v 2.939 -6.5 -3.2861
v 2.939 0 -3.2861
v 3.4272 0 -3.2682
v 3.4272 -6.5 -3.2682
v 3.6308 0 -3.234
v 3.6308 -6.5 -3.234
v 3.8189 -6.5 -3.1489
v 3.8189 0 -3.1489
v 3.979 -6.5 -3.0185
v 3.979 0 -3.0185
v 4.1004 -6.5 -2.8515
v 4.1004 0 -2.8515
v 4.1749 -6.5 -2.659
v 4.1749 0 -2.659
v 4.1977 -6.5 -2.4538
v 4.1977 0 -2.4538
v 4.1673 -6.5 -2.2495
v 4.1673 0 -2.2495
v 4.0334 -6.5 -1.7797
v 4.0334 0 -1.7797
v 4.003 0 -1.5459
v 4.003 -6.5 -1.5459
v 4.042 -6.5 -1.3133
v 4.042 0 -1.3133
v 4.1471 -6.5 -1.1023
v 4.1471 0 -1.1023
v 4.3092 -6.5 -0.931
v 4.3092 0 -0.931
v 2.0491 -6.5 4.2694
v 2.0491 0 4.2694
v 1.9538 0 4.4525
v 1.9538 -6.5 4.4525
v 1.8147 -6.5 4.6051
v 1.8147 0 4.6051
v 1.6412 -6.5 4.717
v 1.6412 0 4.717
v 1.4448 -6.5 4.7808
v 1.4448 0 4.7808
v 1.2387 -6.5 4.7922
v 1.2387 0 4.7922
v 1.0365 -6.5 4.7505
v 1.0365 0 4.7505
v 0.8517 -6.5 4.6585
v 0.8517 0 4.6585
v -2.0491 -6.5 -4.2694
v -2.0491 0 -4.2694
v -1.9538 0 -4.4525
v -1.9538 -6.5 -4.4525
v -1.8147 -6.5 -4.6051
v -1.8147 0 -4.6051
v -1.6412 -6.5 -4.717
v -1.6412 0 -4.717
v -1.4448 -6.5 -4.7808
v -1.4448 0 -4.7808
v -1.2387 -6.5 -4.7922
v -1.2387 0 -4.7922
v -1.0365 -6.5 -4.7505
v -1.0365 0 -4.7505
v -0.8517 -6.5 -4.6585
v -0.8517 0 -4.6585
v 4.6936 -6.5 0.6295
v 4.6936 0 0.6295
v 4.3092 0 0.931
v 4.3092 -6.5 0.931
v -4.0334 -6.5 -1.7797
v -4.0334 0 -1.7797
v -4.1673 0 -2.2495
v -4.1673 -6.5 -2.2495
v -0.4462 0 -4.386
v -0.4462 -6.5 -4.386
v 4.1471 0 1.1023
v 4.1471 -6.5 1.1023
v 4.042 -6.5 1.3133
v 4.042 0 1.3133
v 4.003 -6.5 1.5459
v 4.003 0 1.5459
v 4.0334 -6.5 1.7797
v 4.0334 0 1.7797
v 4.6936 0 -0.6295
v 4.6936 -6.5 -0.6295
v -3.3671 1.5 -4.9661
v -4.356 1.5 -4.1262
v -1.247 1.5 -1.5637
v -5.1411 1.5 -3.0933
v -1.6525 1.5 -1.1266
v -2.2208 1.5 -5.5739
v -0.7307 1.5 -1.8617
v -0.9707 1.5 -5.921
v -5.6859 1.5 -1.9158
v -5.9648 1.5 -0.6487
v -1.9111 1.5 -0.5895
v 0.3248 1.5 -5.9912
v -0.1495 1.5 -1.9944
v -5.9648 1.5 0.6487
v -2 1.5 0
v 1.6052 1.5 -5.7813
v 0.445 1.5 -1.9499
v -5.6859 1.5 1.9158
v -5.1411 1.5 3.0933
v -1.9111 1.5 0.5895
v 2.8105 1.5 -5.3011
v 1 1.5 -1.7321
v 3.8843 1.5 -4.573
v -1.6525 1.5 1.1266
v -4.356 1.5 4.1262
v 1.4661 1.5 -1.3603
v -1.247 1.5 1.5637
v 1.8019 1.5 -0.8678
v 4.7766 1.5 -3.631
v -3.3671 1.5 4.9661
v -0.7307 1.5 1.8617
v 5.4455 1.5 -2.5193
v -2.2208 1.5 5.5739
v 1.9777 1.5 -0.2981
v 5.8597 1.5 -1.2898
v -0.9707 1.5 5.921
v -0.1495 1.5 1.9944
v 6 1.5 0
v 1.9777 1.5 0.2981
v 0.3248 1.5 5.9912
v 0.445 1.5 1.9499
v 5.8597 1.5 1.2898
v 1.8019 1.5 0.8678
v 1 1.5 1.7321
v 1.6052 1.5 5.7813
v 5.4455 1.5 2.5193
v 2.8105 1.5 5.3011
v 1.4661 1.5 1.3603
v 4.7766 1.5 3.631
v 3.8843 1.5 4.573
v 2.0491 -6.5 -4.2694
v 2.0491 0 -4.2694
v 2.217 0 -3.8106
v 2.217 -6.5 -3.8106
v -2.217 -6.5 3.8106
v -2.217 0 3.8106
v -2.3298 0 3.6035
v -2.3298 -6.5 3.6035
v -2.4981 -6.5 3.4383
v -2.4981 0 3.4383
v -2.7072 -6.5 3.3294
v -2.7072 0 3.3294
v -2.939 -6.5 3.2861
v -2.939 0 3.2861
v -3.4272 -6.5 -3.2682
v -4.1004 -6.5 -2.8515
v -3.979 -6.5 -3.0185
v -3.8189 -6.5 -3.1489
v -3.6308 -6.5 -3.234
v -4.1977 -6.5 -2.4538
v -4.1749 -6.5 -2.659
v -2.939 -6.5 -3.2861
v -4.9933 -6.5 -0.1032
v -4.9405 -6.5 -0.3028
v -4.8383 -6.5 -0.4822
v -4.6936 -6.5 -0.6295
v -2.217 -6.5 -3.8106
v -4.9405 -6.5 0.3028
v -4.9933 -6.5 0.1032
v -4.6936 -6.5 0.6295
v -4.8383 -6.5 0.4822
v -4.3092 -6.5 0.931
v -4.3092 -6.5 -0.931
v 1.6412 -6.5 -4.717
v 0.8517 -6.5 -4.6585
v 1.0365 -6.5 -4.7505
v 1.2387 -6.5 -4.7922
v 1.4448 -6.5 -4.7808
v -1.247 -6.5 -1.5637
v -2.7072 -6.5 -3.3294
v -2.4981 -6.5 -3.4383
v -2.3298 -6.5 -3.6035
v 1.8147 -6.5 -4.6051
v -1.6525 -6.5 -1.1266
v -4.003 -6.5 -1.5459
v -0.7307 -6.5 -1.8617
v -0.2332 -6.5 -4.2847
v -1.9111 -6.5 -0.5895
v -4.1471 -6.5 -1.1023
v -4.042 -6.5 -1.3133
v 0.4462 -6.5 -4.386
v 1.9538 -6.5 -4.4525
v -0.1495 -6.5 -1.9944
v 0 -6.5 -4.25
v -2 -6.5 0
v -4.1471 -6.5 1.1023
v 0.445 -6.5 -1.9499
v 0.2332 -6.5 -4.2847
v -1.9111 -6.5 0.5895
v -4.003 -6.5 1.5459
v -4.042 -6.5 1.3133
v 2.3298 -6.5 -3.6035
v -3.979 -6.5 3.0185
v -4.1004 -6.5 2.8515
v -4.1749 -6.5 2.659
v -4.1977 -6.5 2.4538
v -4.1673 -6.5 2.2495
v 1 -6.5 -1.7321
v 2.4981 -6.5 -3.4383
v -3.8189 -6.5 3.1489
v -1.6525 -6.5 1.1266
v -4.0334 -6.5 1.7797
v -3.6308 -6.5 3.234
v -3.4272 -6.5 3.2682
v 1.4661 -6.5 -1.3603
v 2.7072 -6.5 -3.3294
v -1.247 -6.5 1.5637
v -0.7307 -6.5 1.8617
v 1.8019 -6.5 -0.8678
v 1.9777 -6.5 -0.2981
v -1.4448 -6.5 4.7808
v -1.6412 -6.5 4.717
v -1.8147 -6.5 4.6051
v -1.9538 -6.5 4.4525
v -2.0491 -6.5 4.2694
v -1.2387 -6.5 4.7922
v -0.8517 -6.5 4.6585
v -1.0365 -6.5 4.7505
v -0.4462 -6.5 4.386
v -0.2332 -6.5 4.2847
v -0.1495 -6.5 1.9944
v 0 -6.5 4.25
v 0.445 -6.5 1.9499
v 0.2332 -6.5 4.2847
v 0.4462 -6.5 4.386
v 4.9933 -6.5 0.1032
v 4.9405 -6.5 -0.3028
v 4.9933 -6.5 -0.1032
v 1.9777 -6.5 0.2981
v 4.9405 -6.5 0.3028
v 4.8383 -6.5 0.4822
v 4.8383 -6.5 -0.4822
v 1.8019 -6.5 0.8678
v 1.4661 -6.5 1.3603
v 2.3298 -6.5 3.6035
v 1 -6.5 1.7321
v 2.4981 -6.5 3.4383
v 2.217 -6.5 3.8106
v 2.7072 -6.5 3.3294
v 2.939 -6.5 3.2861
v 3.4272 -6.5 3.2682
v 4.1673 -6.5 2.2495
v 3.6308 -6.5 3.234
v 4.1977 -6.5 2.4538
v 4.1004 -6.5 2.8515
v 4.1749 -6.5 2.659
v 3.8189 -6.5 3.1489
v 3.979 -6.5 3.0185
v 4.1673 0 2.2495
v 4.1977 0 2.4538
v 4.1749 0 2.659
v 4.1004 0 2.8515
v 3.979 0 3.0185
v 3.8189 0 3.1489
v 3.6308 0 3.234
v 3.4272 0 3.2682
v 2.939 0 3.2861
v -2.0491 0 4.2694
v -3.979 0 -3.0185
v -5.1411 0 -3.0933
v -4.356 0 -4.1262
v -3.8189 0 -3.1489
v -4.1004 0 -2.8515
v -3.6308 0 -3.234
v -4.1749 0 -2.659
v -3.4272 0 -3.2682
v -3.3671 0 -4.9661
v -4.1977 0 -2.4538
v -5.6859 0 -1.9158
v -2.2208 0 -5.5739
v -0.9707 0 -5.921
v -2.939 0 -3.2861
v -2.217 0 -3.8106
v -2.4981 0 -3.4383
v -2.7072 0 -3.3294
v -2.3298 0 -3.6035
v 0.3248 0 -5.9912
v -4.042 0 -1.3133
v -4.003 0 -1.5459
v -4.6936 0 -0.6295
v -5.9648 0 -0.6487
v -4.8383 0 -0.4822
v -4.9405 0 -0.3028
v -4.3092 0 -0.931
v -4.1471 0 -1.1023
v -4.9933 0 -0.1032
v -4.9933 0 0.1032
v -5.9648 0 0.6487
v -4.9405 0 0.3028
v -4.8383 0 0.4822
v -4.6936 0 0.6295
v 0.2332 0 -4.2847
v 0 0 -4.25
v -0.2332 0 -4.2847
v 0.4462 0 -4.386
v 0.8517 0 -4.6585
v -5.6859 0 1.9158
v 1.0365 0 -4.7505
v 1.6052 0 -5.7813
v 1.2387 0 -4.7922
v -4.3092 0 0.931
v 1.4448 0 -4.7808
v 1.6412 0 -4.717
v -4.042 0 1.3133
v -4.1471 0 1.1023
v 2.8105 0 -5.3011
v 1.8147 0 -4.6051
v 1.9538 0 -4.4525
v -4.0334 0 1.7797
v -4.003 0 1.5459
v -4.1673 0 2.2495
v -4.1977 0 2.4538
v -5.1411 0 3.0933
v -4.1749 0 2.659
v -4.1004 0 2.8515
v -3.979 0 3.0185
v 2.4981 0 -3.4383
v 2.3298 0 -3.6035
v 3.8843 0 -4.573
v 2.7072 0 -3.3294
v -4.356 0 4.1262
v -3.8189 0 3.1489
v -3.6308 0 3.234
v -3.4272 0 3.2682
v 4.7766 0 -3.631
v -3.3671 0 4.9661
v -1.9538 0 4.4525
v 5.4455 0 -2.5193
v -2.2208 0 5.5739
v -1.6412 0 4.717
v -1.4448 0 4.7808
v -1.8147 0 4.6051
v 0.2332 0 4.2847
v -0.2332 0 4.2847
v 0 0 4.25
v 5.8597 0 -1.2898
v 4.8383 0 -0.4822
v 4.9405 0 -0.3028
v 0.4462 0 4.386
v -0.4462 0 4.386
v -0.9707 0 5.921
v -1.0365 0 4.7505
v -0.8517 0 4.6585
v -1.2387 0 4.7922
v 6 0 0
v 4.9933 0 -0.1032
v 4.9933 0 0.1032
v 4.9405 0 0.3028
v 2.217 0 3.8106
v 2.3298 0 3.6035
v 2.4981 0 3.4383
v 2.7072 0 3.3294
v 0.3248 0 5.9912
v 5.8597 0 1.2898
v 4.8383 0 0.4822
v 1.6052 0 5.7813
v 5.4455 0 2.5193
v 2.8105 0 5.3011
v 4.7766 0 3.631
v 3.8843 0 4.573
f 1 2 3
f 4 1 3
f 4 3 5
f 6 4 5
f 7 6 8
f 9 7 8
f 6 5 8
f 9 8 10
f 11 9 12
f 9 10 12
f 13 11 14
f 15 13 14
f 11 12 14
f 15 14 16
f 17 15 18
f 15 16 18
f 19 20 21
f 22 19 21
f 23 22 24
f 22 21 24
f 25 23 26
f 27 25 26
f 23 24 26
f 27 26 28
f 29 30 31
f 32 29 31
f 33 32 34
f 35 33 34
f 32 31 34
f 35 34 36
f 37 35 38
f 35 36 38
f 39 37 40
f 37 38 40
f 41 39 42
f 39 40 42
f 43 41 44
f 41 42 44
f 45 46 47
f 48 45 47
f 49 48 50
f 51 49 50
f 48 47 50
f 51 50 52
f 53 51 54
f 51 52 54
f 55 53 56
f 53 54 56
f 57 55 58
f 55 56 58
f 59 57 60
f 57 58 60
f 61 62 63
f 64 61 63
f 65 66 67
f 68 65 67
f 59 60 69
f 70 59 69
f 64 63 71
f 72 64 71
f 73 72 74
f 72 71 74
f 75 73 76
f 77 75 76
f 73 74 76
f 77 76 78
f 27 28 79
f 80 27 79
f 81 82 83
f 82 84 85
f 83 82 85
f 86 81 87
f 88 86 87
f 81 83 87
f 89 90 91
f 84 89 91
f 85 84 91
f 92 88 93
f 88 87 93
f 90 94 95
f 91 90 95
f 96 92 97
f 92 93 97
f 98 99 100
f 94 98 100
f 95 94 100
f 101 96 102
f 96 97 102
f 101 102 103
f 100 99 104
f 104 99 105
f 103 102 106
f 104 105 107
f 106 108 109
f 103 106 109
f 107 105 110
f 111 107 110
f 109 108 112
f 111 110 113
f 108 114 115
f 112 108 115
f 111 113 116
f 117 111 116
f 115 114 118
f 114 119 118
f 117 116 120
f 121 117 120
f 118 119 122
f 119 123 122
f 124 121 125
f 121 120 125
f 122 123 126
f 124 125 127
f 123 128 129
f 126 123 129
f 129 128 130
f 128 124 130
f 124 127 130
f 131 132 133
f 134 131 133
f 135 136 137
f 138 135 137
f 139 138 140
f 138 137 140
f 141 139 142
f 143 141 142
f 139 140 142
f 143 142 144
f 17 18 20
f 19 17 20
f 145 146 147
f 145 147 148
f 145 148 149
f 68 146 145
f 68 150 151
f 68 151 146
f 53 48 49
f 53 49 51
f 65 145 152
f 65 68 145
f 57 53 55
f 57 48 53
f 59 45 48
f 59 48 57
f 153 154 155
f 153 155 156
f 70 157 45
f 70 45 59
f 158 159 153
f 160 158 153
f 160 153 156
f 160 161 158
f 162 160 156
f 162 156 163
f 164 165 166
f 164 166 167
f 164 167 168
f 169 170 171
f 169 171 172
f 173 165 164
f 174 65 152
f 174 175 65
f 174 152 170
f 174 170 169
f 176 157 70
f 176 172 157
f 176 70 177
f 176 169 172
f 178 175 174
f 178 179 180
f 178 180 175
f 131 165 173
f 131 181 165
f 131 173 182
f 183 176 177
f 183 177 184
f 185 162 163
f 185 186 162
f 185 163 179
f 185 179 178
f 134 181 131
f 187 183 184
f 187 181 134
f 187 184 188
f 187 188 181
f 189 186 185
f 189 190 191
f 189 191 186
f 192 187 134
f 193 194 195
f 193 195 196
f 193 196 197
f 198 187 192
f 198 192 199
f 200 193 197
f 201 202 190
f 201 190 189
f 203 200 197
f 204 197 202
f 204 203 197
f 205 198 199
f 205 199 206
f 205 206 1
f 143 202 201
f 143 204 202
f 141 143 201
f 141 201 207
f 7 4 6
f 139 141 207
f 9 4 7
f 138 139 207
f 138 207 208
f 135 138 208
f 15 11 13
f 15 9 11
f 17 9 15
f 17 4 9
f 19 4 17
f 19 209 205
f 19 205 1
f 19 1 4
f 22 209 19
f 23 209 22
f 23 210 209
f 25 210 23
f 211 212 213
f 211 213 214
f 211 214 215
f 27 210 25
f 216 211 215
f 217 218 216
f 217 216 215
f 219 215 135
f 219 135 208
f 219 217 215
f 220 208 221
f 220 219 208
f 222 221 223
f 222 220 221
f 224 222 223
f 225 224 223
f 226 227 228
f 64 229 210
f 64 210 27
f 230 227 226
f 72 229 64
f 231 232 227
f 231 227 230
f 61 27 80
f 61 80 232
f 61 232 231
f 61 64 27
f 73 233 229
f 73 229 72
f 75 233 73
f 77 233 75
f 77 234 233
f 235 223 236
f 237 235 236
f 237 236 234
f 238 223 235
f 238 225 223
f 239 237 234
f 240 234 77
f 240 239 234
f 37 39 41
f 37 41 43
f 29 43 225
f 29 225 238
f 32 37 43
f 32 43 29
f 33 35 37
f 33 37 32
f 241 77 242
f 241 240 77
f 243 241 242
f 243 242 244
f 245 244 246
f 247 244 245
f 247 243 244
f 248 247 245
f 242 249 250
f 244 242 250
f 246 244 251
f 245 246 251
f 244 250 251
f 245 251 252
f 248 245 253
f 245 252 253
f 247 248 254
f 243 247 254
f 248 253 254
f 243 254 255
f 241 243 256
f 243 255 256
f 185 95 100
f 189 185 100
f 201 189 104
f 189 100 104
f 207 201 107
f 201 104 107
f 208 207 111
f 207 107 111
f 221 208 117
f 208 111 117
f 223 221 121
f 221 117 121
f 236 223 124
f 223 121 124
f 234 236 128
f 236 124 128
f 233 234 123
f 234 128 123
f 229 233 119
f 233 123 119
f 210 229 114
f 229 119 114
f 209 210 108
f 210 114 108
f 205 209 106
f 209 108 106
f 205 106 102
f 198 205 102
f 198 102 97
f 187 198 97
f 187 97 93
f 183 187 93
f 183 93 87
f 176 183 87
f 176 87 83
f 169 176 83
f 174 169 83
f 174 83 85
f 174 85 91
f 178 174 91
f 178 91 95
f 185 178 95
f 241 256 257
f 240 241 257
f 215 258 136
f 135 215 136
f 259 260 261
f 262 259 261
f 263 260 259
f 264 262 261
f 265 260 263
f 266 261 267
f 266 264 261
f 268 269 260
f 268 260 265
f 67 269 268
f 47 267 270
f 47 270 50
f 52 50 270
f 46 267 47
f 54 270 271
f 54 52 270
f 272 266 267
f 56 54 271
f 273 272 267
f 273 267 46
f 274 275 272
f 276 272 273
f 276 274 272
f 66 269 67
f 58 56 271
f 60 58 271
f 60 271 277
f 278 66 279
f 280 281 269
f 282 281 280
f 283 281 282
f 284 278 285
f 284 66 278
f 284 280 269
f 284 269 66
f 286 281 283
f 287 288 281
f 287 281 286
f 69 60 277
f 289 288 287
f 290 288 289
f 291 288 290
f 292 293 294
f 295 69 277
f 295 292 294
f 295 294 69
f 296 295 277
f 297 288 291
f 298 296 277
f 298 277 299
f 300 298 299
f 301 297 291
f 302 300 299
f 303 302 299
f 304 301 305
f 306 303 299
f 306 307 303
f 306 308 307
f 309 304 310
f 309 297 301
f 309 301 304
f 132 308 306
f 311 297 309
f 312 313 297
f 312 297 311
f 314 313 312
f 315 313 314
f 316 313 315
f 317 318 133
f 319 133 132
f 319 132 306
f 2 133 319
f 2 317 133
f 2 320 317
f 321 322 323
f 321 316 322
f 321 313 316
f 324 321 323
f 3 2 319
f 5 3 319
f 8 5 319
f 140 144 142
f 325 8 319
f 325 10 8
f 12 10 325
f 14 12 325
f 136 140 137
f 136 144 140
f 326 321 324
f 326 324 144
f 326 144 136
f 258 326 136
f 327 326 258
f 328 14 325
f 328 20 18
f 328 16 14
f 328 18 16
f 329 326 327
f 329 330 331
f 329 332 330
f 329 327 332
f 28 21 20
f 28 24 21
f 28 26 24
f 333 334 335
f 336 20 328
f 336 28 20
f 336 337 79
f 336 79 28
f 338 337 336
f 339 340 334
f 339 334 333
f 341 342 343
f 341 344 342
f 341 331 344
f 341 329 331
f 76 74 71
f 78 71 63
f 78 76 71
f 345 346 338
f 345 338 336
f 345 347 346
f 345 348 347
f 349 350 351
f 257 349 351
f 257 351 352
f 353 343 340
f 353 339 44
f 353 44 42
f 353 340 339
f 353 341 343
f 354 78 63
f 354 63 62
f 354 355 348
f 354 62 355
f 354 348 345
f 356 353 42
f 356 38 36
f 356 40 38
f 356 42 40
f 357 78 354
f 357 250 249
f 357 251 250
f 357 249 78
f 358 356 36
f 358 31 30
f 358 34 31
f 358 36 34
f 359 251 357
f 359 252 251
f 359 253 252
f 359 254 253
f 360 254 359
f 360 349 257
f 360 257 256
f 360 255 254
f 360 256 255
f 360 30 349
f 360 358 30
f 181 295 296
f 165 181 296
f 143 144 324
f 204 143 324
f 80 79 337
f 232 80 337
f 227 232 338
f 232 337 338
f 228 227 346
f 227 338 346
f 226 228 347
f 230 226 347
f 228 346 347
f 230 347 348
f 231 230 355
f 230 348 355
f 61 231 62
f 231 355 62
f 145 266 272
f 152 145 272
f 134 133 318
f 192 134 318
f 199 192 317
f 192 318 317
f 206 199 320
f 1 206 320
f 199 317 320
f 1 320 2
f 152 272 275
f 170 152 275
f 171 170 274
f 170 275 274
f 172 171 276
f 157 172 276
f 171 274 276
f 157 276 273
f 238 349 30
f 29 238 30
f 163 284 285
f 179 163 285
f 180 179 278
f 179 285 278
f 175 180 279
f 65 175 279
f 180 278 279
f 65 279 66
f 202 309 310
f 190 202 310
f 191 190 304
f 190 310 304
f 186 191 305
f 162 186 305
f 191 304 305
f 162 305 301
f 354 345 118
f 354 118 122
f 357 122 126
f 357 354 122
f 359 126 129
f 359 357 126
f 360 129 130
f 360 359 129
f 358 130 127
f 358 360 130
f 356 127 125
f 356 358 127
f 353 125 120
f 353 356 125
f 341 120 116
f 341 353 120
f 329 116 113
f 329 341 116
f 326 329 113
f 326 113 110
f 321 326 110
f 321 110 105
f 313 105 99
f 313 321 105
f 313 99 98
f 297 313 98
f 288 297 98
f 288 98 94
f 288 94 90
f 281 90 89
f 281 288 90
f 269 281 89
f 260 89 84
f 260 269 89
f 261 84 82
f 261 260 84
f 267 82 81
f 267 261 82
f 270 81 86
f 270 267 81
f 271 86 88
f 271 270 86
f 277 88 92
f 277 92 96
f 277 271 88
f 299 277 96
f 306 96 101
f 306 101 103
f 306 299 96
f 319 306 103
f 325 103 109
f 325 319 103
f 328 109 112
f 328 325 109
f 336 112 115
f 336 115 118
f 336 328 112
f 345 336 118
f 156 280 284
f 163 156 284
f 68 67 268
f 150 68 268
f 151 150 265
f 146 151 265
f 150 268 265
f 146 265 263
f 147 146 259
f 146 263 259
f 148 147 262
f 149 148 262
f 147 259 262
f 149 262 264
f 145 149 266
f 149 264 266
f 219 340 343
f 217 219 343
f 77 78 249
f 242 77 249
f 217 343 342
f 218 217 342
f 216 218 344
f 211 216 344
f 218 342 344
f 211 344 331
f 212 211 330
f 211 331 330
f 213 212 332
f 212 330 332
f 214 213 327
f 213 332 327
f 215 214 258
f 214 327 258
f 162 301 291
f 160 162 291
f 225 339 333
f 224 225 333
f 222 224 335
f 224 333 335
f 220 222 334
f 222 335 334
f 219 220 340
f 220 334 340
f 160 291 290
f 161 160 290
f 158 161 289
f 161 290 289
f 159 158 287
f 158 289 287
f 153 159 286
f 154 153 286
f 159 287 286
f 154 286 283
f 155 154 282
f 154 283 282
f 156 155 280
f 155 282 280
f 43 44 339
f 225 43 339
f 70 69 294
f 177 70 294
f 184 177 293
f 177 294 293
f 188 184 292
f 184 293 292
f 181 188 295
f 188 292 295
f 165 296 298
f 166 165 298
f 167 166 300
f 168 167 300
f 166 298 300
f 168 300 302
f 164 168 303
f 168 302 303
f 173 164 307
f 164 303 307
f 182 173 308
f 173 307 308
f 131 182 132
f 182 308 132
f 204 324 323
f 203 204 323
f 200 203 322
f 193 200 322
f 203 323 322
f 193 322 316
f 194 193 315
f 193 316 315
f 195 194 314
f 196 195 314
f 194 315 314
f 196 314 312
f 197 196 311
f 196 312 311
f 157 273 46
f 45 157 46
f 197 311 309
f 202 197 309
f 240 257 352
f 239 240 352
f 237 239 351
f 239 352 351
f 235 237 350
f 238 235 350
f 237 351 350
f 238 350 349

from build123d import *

# Parameters (mm, degrees)
F1_DEPTH = 6.5
F0_R     = 6
F2_DEPTH = 1.5
F4_D     = 4


with BuildPart() as f1:
    # F0 (on Front) → F1 (new body)
    with BuildSketch(Plane.XZ):
        with BuildLine():
            ThreePointArc((2.938982, 3.286074), (2.498087, 3.438322), (2.217047, 3.810591))
            Line((2.217047, 3.810591), (2.04914, 4.269383))
            ThreePointArc((2.04914, 4.269383), (1.545085, 4.755283), (0.851691, 4.658458))
            Line((0.851691, 4.658458), (0.446181, 4.38598))
            ThreePointArc((0.446181, 4.38598), (0, 4.25), (-0.446181, 4.38598))
            Line((-0.446181, 4.38598), (-0.851691, 4.658458))
            ThreePointArc((-0.851691, 4.658458), (-1.545085, 4.755283), (-2.04914, 4.269383))
            Line((-2.04914, 4.269383), (-2.217047, 3.810591))
            ThreePointArc((-2.217047, 3.810591), (-2.498087, 3.438322), (-2.938982, 3.286074))
            Line((-2.938982, 3.286074), (-3.427205, 3.26816))
            ThreePointArc((-3.427205, 3.26816), (-4.045085, 2.938926), (-4.16727, 2.249549))
            Line((-4.16727, 2.249549), (-4.033437, 1.779685))
            ThreePointArc((-4.033437, 1.779685), (-4.04199, 1.313322), (-4.309192, 0.930999))
            Line((-4.309192, 0.930999), (-4.693643, 0.629537))
            ThreePointArc((-4.693643, 0.629537), (-5, 0), (-4.693643, -0.629537))
            Line((-4.693643, -0.629537), (-4.309192, -0.930999))
            ThreePointArc((-4.309192, -0.930999), (-4.04199, -1.313322), (-4.033437, -1.779685))
            Line((-4.033437, -1.779685), (-4.16727, -2.249549))
            ThreePointArc((-4.16727, -2.249549), (-4.045085, -2.938926), (-3.427205, -3.26816))
            Line((-3.427205, -3.26816), (-2.938982, -3.286074))
            ThreePointArc((-2.938982, -3.286074), (-2.498087, -3.438322), (-2.217047, -3.810591))
            Line((-2.217047, -3.810591), (-2.04914, -4.269383))
            ThreePointArc((-2.04914, -4.269383), (-1.545085, -4.755283), (-0.851691, -4.658458))
            Line((-0.851691, -4.658458), (-0.446181, -4.38598))
            ThreePointArc((-0.446181, -4.38598), (0, -4.25), (0.446181, -4.38598))
            Line((0.446181, -4.38598), (0.851691, -4.658458))
            ThreePointArc((0.851691, -4.658458), (1.545085, -4.755283), (2.04914, -4.269383))
            Line((2.04914, -4.269383), (2.217047, -3.810591))
            ThreePointArc((2.217047, -3.810591), (2.498087, -3.438322), (2.938982, -3.286074))
            Line((2.938982, -3.286074), (3.427205, -3.26816))
            ThreePointArc((3.427205, -3.26816), (4.045085, -2.938926), (4.16727, -2.249549))
            Line((4.16727, -2.249549), (4.033437, -1.779685))
            ThreePointArc((4.033437, -1.779685), (4.04199, -1.313322), (4.309192, -0.930999))
            Line((4.309192, -0.930999), (4.693643, -0.629537))
            ThreePointArc((4.693643, -0.629537), (5, 0), (4.693643, 0.629537))
            Line((4.693643, 0.629537), (4.309192, 0.930999))
            ThreePointArc((4.309192, 0.930999), (4.04199, 1.313322), (4.033437, 1.779685))
            Line((4.033437, 1.779685), (4.16727, 2.249549))
            ThreePointArc((4.16727, 2.249549), (4.045085, 2.938926), (3.427205, 3.26816))
            Line((3.427205, 3.26816), (2.938982, 3.286074))
        make_face()
    extrude(amount=F1_DEPTH)

    # F0 (on Front) → F2 (join)
    with BuildSketch(Plane.XZ):
        Circle(F0_R)
        with BuildLine():
            Line((2.04914, 4.269383), (2.217047, 3.810591))
            ThreePointArc((2.217047, 3.810591), (2.498087, 3.438322), (2.938982, 3.286074))
            Line((2.938982, 3.286074), (3.427205, 3.26816))
            ThreePointArc((3.427205, 3.26816), (4.045085, 2.938926), (4.16727, 2.249549))
            Line((4.16727, 2.249549), (4.033437, 1.779685))
            ThreePointArc((4.033437, 1.779685), (4.04199, 1.313322), (4.309192, 0.930999))
            Line((4.309192, 0.930999), (4.693643, 0.629537))
            ThreePointArc((4.693643, 0.629537), (5, 0), (4.693643, -0.629537))
            Line((4.693643, -0.629537), (4.309192, -0.930999))
            ThreePointArc((4.309192, -0.930999), (4.04199, -1.313322), (4.033437, -1.779685))
            Line((4.033437, -1.779685), (4.16727, -2.249549))
            ThreePointArc((4.16727, -2.249549), (4.045085, -2.938926), (3.427205, -3.26816))
            Line((3.427205, -3.26816), (2.938982, -3.286074))
            ThreePointArc((2.938982, -3.286074), (2.498087, -3.438322), (2.217047, -3.810591))
            Line((2.217047, -3.810591), (2.04914, -4.269383))
            ThreePointArc((2.04914, -4.269383), (1.545085, -4.755283), (0.851691, -4.658458))
            Line((0.851691, -4.658458), (0.446181, -4.38598))
            ThreePointArc((0.446181, -4.38598), (0, -4.25), (-0.446181, -4.38598))
            Line((-0.446181, -4.38598), (-0.851691, -4.658458))
            ThreePointArc((-0.851691, -4.658458), (-1.545085, -4.755283), (-2.04914, -4.269383))
            Line((-2.04914, -4.269383), (-2.217047, -3.810591))
            ThreePointArc((-2.217047, -3.810591), (-2.498087, -3.438322), (-2.938982, -3.286074))
            Line((-2.938982, -3.286074), (-3.427205, -3.26816))
            ThreePointArc((-3.427205, -3.26816), (-4.045085, -2.938926), (-4.16727, -2.249549))
            Line((-4.16727, -2.249549), (-4.033437, -1.779685))
            ThreePointArc((-4.033437, -1.779685), (-4.04199, -1.313322), (-4.309192, -0.930999))
            Line((-4.309192, -0.930999), (-4.693643, -0.629537))
            ThreePointArc((-4.693643, -0.629537), (-5, 0), (-4.693643, 0.629537))
            Line((-4.693643, 0.629537), (-4.309192, 0.930999))
            ThreePointArc((-4.309192, 0.930999), (-4.04199, 1.313322), (-4.033437, 1.779685))
            Line((-4.033437, 1.779685), (-4.16727, 2.249549))
            ThreePointArc((-4.16727, 2.249549), (-4.045085, 2.938926), (-3.427205, 3.26816))
            Line((-3.427205, 3.26816), (-2.938982, 3.286074))
            ThreePointArc((-2.938982, 3.286074), (-2.498087, 3.438322), (-2.217047, 3.810591))
            Line((-2.217047, 3.810591), (-2.04914, 4.269383))
            ThreePointArc((-2.04914, 4.269383), (-1.545085, 4.755283), (-0.851691, 4.658458))
            Line((-0.851691, 4.658458), (-0.446181, 4.38598))
            ThreePointArc((-0.446181, 4.38598), (0, 4.25), (0.446181, 4.38598))
            Line((0.446181, 4.38598), (0.851691, 4.658458))
            ThreePointArc((0.851691, 4.658458), (1.545085, 4.755283), (2.04914, 4.269383))
        make_face(mode=Mode.SUBTRACT)
        with BuildLine():
            ThreePointArc((2.938982, 3.286074), (2.498087, 3.438322), (2.217047, 3.810591))
            Line((2.217047, 3.810591), (2.04914, 4.269383))
            ThreePointArc((2.04914, 4.269383), (1.545085, 4.755283), (0.851691, 4.658458))
            Line((0.851691, 4.658458), (0.446181, 4.38598))
            ThreePointArc((0.446181, 4.38598), (0, 4.25), (-0.446181, 4.38598))
            Line((-0.446181, 4.38598), (-0.851691, 4.658458))
            ThreePointArc((-0.851691, 4.658458), (-1.545085, 4.755283), (-2.04914, 4.269383))
            Line((-2.04914, 4.269383), (-2.217047, 3.810591))
            ThreePointArc((-2.217047, 3.810591), (-2.498087, 3.438322), (-2.938982, 3.286074))
            Line((-2.938982, 3.286074), (-3.427205, 3.26816))
            ThreePointArc((-3.427205, 3.26816), (-4.045085, 2.938926), (-4.16727, 2.249549))
            Line((-4.16727, 2.249549), (-4.033437, 1.779685))
            ThreePointArc((-4.033437, 1.779685), (-4.04199, 1.313322), (-4.309192, 0.930999))
            Line((-4.309192, 0.930999), (-4.693643, 0.629537))
            ThreePointArc((-4.693643, 0.629537), (-5, 0), (-4.693643, -0.629537))
            Line((-4.693643, -0.629537), (-4.309192, -0.930999))
            ThreePointArc((-4.309192, -0.930999), (-4.04199, -1.313322), (-4.033437, -1.779685))
            Line((-4.033437, -1.779685), (-4.16727, -2.249549))
            ThreePointArc((-4.16727, -2.249549), (-4.045085, -2.938926), (-3.427205, -3.26816))
            Line((-3.427205, -3.26816), (-2.938982, -3.286074))
            ThreePointArc((-2.938982, -3.286074), (-2.498087, -3.438322), (-2.217047, -3.810591))
            Line((-2.217047, -3.810591), (-2.04914, -4.269383))
            ThreePointArc((-2.04914, -4.269383), (-1.545085, -4.755283), (-0.851691, -4.658458))
            Line((-0.851691, -4.658458), (-0.446181, -4.38598))
            ThreePointArc((-0.446181, -4.38598), (0, -4.25), (0.446181, -4.38598))
            Line((0.446181, -4.38598), (0.851691, -4.658458))
            ThreePointArc((0.851691, -4.658458), (1.545085, -4.755283), (2.04914, -4.269383))
            Line((2.04914, -4.269383), (2.217047, -3.810591))
            ThreePointArc((2.217047, -3.810591), (2.498087, -3.438322), (2.938982, -3.286074))
            Line((2.938982, -3.286074), (3.427205, -3.26816))
            ThreePointArc((3.427205, -3.26816), (4.045085, -2.938926), (4.16727, -2.249549))
            Line((4.16727, -2.249549), (4.033437, -1.779685))
            ThreePointArc((4.033437, -1.779685), (4.04199, -1.313322), (4.309192, -0.930999))
            Line((4.309192, -0.930999), (4.693643, -0.629537))
            ThreePointArc((4.693643, -0.629537), (5, 0), (4.693643, 0.629537))
            Line((4.693643, 0.629537), (4.309192, 0.930999))
            ThreePointArc((4.309192, 0.930999), (4.04199, 1.313322), (4.033437, 1.779685))
            Line((4.033437, 1.779685), (4.16727, 2.249549))
            ThreePointArc((4.16727, 2.249549), (4.045085, 2.938926), (3.427205, 3.26816))
            Line((3.427205, 3.26816), (2.938982, 3.286074))
        make_face()
    extrude(amount=-F2_DEPTH)

    # F4 (through all)
    with Locations(Plane.XZ.offset(6.5)):
        with Locations((0, 0)):
            Hole(F4_D / 2)


solid = f1.part
